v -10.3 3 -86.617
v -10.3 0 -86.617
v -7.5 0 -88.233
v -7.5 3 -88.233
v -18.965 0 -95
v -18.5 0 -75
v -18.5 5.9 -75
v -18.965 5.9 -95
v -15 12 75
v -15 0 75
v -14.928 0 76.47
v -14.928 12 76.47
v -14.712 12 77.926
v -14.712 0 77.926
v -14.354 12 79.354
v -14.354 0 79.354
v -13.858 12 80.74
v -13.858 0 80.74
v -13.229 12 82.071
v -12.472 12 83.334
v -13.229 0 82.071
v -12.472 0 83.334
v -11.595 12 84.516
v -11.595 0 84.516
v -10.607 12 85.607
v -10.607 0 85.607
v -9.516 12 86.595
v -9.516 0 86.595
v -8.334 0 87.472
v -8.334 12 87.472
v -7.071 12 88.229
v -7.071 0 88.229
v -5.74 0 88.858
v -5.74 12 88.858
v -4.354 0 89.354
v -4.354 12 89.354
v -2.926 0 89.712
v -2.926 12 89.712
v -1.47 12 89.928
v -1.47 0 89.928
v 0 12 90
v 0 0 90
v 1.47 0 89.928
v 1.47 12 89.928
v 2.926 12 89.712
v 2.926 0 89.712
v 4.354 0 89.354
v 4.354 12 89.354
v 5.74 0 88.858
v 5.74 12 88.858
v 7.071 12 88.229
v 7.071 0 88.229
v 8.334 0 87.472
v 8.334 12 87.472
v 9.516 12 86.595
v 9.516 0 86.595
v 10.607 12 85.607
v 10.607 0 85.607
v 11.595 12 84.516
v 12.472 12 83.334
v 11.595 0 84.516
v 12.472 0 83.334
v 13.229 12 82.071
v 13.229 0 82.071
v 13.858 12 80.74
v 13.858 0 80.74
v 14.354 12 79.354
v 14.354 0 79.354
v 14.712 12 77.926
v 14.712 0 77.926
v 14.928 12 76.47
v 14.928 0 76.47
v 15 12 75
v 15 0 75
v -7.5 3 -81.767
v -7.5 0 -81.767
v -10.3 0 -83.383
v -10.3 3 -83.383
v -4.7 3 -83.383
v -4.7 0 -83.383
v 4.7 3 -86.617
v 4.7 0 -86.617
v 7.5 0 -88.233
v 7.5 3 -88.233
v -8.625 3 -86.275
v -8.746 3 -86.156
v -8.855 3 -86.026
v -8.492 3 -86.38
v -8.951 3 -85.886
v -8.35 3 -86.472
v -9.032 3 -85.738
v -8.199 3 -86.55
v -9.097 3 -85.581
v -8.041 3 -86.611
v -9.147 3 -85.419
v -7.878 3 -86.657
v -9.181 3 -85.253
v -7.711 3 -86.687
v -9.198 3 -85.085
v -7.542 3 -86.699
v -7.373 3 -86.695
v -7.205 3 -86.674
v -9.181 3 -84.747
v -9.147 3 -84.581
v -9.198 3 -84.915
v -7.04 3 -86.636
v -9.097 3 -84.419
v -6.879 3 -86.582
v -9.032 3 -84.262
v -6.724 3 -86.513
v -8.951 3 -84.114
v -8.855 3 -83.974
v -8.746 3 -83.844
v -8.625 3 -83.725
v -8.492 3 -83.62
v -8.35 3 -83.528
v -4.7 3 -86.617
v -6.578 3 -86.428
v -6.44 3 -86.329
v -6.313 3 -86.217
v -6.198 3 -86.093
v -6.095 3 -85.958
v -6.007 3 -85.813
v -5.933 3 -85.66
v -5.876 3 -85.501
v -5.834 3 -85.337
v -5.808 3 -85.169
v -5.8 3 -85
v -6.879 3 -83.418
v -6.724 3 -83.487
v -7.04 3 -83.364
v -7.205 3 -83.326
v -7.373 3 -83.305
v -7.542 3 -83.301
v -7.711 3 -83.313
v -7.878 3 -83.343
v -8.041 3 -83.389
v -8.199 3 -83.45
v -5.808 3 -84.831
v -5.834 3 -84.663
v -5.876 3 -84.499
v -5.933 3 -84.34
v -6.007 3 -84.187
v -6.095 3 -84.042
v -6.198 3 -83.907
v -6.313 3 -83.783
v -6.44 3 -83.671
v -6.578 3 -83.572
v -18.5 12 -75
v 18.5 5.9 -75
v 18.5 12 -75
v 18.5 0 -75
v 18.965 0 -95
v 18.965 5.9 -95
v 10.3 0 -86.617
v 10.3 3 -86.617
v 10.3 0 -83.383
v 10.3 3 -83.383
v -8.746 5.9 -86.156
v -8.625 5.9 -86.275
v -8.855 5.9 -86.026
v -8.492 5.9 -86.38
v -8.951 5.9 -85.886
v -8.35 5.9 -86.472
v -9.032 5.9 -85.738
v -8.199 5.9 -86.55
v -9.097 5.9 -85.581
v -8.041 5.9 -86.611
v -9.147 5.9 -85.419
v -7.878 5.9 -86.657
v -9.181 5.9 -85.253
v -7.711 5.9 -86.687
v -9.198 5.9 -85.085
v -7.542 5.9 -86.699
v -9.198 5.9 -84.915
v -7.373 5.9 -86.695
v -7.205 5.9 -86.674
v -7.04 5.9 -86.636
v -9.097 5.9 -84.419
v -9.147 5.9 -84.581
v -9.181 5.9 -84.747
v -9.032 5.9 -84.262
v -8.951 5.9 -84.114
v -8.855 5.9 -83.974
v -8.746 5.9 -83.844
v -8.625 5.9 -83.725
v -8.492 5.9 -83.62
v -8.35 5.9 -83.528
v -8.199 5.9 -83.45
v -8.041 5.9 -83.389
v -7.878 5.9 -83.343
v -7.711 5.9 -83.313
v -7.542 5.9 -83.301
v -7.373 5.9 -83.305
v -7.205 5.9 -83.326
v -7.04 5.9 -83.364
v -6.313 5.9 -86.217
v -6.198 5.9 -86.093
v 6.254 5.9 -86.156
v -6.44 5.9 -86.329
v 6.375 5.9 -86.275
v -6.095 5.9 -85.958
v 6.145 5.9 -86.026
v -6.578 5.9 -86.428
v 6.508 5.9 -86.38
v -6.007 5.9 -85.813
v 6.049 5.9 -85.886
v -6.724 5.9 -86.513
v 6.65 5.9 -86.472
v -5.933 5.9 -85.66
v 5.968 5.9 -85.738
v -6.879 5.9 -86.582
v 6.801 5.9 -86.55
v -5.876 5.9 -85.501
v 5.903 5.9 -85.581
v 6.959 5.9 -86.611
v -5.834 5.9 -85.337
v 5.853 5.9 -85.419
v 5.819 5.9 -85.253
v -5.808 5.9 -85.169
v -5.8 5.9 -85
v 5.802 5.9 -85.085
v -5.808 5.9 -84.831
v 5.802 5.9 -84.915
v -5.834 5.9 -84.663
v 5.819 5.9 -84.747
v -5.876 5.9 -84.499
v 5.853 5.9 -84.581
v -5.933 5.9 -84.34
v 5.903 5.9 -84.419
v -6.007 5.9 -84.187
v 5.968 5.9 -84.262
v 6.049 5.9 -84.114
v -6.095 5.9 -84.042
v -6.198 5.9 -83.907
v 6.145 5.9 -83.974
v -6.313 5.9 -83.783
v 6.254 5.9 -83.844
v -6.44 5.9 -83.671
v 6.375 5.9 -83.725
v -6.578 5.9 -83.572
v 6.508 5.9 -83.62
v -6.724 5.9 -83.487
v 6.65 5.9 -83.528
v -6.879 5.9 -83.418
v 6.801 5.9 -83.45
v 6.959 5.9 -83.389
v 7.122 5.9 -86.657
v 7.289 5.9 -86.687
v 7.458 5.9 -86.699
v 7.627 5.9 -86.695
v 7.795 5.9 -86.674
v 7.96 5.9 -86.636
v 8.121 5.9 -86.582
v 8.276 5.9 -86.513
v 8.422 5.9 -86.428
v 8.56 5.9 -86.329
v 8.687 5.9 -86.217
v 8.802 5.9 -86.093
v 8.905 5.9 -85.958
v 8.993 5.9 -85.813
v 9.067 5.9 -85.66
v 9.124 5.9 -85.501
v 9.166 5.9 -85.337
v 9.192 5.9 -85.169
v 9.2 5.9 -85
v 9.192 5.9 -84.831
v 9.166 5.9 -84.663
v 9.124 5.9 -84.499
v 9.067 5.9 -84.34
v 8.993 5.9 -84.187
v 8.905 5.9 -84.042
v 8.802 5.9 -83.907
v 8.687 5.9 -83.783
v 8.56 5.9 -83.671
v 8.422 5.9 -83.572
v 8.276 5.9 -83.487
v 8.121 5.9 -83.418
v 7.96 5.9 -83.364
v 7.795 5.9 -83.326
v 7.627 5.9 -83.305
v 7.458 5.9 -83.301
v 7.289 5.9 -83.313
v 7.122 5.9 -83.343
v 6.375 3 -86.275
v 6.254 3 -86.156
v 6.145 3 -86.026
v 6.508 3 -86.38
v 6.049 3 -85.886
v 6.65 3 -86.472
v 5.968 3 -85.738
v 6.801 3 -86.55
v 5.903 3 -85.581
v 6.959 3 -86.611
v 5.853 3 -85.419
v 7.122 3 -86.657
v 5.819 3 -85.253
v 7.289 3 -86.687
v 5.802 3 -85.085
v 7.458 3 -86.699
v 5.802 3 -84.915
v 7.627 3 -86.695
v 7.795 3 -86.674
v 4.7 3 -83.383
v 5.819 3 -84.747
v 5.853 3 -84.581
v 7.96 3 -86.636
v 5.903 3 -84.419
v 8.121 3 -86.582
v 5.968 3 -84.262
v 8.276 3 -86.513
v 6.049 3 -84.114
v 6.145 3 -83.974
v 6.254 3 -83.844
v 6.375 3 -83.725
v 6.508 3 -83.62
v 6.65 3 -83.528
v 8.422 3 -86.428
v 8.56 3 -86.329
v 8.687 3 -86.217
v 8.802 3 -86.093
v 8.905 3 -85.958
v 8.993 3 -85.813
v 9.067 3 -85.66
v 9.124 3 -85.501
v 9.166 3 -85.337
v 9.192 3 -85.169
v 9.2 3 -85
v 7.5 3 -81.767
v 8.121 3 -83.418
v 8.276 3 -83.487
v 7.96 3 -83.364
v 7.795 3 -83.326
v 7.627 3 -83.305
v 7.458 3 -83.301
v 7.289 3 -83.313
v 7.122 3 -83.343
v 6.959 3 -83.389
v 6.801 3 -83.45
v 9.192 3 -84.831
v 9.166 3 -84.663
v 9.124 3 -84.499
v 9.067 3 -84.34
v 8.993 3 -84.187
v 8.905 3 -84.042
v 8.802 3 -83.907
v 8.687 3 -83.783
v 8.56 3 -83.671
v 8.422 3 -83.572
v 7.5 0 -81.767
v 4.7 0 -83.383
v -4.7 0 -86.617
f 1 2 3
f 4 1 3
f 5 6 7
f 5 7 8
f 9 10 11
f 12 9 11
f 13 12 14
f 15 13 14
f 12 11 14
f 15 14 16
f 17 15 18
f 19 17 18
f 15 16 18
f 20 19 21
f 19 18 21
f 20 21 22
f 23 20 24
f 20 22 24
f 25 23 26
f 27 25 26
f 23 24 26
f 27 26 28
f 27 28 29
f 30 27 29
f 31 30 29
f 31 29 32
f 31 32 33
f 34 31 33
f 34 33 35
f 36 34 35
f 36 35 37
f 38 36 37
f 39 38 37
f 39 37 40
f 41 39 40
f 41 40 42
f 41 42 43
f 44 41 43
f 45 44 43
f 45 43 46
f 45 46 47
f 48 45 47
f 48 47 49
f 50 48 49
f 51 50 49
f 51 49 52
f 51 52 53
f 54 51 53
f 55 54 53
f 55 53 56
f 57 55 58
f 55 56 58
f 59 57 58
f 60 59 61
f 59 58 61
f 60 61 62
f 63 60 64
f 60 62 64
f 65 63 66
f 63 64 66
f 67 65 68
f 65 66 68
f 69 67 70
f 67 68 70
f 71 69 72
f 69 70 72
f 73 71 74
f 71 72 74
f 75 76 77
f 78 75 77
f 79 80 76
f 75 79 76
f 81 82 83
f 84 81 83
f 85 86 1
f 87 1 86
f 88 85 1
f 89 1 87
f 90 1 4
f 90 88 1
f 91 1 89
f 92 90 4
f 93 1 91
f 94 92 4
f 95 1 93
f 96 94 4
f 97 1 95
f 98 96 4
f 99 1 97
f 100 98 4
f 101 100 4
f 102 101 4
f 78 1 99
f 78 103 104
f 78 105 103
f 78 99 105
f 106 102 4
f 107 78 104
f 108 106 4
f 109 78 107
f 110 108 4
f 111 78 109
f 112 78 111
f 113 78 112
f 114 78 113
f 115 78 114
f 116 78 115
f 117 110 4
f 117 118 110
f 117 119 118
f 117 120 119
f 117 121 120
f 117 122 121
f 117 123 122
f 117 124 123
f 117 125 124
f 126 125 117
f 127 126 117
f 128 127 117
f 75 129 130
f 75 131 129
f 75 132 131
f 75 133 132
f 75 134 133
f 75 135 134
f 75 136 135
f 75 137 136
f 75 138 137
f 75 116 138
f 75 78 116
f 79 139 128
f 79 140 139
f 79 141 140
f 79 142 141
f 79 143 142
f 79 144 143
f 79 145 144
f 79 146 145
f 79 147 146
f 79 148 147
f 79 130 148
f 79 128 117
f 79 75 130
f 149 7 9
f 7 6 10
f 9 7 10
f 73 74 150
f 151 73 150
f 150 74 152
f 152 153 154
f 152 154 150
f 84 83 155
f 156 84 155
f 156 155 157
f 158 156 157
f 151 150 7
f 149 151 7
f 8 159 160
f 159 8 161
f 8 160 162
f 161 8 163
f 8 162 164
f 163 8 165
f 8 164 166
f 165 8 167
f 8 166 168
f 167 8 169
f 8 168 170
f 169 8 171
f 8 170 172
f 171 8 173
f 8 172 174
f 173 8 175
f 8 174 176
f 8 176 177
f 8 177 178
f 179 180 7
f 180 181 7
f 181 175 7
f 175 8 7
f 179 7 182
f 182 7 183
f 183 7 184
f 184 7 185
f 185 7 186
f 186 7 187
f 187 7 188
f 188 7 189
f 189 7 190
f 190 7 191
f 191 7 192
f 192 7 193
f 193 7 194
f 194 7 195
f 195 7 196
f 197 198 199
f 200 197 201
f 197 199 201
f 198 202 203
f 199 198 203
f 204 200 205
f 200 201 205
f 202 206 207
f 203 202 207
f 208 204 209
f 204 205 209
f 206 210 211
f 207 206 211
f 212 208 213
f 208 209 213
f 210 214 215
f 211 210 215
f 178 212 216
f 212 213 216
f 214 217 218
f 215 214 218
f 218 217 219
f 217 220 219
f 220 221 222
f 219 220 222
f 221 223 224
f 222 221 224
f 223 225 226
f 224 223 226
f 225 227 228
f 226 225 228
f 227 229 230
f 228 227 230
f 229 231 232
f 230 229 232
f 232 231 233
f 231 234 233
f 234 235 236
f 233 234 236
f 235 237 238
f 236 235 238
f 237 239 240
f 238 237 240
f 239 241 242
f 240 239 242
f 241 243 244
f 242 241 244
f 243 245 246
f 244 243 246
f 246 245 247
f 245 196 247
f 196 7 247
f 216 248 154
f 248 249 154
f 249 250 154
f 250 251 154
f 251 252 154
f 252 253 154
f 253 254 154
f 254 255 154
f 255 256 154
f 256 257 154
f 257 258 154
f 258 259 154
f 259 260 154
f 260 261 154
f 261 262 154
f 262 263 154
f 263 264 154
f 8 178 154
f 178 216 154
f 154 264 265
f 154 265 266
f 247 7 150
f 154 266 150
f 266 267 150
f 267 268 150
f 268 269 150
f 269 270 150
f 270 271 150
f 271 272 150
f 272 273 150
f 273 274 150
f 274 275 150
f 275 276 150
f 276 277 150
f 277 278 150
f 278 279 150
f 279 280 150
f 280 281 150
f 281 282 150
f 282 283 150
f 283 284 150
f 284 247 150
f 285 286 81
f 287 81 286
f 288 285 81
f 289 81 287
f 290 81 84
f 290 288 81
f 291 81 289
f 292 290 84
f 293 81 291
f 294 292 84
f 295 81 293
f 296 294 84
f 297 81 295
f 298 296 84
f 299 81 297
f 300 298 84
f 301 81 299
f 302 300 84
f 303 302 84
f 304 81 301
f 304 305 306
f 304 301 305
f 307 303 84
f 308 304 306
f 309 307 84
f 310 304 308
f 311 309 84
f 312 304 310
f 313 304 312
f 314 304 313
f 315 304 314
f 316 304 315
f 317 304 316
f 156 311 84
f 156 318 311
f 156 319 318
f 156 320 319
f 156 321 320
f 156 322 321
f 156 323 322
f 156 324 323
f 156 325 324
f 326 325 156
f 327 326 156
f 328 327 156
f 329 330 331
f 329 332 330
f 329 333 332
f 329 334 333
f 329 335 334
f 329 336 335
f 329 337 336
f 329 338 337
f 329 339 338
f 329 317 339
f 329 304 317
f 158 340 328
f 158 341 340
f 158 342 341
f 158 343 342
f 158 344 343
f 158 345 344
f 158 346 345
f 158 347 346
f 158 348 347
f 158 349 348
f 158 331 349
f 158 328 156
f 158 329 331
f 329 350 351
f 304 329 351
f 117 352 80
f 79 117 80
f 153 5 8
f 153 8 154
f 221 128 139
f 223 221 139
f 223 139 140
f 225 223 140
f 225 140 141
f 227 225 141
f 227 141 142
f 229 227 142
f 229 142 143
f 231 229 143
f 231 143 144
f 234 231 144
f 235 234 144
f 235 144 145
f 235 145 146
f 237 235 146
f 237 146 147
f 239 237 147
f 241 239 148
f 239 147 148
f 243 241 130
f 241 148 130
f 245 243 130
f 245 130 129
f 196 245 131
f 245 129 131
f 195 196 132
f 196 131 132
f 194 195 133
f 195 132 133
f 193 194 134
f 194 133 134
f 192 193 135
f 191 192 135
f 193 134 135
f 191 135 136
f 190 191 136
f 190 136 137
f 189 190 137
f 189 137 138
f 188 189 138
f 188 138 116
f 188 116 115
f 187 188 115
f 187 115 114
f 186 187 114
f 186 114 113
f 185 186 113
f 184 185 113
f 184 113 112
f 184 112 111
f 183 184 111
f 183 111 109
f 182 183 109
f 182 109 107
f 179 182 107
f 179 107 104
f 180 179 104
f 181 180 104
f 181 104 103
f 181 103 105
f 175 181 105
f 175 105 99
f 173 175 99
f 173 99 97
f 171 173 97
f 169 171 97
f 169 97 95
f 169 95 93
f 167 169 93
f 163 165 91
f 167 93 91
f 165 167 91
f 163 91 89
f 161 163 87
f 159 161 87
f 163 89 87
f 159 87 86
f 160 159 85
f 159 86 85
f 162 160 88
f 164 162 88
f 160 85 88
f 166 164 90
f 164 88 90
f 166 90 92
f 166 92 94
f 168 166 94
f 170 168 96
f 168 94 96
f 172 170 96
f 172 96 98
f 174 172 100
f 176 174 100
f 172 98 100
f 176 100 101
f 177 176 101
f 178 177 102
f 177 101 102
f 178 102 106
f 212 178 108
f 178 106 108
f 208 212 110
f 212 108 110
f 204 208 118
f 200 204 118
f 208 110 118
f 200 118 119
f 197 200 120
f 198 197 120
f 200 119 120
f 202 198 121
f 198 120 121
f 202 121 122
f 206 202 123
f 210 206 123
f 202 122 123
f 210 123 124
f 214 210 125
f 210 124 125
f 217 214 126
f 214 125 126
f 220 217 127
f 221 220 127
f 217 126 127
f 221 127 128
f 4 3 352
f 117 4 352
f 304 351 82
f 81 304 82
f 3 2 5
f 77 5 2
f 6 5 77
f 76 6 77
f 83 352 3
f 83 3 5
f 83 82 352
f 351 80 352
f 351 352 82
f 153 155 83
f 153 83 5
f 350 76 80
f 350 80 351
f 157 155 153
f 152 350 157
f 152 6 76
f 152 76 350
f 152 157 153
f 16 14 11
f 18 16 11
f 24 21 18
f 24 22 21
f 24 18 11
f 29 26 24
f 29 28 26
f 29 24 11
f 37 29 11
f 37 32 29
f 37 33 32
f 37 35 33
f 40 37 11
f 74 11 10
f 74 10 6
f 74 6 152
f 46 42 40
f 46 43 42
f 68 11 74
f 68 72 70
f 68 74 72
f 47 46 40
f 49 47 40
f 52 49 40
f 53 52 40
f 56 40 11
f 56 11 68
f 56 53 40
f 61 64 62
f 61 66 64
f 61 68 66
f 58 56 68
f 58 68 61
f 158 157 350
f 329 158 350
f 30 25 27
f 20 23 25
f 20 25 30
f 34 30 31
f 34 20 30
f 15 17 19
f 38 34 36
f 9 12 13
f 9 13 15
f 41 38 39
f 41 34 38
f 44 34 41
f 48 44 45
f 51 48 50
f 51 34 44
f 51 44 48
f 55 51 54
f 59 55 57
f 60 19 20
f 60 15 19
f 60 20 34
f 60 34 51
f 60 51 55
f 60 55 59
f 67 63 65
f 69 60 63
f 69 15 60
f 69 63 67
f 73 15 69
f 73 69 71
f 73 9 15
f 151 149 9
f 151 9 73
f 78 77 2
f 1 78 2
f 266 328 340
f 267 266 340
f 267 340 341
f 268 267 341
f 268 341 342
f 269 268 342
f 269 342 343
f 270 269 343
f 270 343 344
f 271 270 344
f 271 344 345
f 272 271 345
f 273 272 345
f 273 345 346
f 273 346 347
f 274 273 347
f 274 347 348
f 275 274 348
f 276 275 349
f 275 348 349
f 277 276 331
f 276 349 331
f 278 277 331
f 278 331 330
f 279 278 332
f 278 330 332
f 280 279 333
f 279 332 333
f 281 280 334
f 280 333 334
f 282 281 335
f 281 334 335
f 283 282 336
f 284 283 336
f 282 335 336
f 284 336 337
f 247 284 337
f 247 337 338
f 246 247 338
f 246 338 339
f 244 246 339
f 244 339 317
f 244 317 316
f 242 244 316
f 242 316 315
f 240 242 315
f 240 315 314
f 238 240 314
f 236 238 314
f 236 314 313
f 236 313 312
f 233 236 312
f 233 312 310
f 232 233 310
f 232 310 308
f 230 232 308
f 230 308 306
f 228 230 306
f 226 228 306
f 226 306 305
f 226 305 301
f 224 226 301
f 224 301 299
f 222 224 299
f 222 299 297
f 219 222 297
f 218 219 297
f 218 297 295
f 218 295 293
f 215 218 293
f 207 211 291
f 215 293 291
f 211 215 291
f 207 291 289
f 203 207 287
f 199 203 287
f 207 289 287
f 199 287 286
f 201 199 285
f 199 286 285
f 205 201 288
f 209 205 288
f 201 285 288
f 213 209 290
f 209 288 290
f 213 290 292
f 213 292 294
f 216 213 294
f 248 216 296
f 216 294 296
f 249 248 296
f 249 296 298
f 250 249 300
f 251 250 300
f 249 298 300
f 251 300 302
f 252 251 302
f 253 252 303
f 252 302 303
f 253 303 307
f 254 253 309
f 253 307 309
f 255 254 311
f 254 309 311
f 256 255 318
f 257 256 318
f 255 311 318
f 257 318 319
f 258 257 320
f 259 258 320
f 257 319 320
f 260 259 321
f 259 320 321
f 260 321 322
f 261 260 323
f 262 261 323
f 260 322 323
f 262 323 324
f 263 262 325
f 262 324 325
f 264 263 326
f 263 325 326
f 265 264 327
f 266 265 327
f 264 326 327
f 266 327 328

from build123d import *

# Parameters (mm, degrees)
BOSS_EXTRUDE1_DEPTH = 12
BOSS_EXTRUDE2_DEPTH = 5.9
SKETCH3_R           = 1.7
CUT_EXTRUDE1_DEPTH  = 5.9
CUT_EXTRUDE2_DEPTH  = 3


with BuildPart() as part:
    # Sketch1 → Boss-Extrude1 (new body)
    with BuildSketch(Plane(origin=(0, 0, 0), x_dir=(1, 0, 0), z_dir=(0, 1, 0))):
        with BuildLine():
            Line((18.5, 75), (-18.5, 75))
            Line((-18.5, 75), (-15, -75))
            ThreePointArc((-15, -75), (0, -90), (15, -75))
            Line((15, -75), (18.5, 75))
        make_face()
    extrude(amount=BOSS_EXTRUDE1_DEPTH)

    # Sketch2 → Boss-Extrude2 (add)
    with BuildSketch(Plane.XZ):
        Polygon((-18.965, -95), (18.965, -95), (18.5, -75), (-18.5, -75), align=None)
        with BuildLine():
            Line((-18.5, -75), (18.5, -75))
            Line((18.5, -75), (15, 75))
            ThreePointArc((15, 75), (0, 90), (-15, 75))
            Line((-15, 75), (-18.5, -75))
        make_face()
    extrude(amount=-BOSS_EXTRUDE2_DEPTH)

    # Sketch3 → Cut-Extrude1 (cut)
    with BuildSketch(Plane.XZ):
        with Locations((-7.5, -85)):
            Circle(SKETCH3_R)
        with Locations((7.5, -85)):
            Circle(SKETCH3_R)
    extrude(amount=-CUT_EXTRUDE1_DEPTH, mode=Mode.SUBTRACT)

    # Sketch4 → Cut-Extrude2 (cut)
    with BuildSketch(Plane.XZ):
        Polygon((-7.5, -81.766838493), (-10.3, -83.383419246), (-10.3, -86.616580754), (-7.5, -88.233161507), (-4.7, -86.616580754), (-4.7, -83.383419246), align=None)
        Polygon((7.5, -81.766838493), (4.7, -83.383419246), (4.7, -86.616580754), (7.5, -88.233161507), (10.3, -86.616580754), (10.3, -83.383419246), align=None)
    extrude(amount=-CUT_EXTRUDE2_DEPTH, mode=Mode.SUBTRACT)


solid = part.part
